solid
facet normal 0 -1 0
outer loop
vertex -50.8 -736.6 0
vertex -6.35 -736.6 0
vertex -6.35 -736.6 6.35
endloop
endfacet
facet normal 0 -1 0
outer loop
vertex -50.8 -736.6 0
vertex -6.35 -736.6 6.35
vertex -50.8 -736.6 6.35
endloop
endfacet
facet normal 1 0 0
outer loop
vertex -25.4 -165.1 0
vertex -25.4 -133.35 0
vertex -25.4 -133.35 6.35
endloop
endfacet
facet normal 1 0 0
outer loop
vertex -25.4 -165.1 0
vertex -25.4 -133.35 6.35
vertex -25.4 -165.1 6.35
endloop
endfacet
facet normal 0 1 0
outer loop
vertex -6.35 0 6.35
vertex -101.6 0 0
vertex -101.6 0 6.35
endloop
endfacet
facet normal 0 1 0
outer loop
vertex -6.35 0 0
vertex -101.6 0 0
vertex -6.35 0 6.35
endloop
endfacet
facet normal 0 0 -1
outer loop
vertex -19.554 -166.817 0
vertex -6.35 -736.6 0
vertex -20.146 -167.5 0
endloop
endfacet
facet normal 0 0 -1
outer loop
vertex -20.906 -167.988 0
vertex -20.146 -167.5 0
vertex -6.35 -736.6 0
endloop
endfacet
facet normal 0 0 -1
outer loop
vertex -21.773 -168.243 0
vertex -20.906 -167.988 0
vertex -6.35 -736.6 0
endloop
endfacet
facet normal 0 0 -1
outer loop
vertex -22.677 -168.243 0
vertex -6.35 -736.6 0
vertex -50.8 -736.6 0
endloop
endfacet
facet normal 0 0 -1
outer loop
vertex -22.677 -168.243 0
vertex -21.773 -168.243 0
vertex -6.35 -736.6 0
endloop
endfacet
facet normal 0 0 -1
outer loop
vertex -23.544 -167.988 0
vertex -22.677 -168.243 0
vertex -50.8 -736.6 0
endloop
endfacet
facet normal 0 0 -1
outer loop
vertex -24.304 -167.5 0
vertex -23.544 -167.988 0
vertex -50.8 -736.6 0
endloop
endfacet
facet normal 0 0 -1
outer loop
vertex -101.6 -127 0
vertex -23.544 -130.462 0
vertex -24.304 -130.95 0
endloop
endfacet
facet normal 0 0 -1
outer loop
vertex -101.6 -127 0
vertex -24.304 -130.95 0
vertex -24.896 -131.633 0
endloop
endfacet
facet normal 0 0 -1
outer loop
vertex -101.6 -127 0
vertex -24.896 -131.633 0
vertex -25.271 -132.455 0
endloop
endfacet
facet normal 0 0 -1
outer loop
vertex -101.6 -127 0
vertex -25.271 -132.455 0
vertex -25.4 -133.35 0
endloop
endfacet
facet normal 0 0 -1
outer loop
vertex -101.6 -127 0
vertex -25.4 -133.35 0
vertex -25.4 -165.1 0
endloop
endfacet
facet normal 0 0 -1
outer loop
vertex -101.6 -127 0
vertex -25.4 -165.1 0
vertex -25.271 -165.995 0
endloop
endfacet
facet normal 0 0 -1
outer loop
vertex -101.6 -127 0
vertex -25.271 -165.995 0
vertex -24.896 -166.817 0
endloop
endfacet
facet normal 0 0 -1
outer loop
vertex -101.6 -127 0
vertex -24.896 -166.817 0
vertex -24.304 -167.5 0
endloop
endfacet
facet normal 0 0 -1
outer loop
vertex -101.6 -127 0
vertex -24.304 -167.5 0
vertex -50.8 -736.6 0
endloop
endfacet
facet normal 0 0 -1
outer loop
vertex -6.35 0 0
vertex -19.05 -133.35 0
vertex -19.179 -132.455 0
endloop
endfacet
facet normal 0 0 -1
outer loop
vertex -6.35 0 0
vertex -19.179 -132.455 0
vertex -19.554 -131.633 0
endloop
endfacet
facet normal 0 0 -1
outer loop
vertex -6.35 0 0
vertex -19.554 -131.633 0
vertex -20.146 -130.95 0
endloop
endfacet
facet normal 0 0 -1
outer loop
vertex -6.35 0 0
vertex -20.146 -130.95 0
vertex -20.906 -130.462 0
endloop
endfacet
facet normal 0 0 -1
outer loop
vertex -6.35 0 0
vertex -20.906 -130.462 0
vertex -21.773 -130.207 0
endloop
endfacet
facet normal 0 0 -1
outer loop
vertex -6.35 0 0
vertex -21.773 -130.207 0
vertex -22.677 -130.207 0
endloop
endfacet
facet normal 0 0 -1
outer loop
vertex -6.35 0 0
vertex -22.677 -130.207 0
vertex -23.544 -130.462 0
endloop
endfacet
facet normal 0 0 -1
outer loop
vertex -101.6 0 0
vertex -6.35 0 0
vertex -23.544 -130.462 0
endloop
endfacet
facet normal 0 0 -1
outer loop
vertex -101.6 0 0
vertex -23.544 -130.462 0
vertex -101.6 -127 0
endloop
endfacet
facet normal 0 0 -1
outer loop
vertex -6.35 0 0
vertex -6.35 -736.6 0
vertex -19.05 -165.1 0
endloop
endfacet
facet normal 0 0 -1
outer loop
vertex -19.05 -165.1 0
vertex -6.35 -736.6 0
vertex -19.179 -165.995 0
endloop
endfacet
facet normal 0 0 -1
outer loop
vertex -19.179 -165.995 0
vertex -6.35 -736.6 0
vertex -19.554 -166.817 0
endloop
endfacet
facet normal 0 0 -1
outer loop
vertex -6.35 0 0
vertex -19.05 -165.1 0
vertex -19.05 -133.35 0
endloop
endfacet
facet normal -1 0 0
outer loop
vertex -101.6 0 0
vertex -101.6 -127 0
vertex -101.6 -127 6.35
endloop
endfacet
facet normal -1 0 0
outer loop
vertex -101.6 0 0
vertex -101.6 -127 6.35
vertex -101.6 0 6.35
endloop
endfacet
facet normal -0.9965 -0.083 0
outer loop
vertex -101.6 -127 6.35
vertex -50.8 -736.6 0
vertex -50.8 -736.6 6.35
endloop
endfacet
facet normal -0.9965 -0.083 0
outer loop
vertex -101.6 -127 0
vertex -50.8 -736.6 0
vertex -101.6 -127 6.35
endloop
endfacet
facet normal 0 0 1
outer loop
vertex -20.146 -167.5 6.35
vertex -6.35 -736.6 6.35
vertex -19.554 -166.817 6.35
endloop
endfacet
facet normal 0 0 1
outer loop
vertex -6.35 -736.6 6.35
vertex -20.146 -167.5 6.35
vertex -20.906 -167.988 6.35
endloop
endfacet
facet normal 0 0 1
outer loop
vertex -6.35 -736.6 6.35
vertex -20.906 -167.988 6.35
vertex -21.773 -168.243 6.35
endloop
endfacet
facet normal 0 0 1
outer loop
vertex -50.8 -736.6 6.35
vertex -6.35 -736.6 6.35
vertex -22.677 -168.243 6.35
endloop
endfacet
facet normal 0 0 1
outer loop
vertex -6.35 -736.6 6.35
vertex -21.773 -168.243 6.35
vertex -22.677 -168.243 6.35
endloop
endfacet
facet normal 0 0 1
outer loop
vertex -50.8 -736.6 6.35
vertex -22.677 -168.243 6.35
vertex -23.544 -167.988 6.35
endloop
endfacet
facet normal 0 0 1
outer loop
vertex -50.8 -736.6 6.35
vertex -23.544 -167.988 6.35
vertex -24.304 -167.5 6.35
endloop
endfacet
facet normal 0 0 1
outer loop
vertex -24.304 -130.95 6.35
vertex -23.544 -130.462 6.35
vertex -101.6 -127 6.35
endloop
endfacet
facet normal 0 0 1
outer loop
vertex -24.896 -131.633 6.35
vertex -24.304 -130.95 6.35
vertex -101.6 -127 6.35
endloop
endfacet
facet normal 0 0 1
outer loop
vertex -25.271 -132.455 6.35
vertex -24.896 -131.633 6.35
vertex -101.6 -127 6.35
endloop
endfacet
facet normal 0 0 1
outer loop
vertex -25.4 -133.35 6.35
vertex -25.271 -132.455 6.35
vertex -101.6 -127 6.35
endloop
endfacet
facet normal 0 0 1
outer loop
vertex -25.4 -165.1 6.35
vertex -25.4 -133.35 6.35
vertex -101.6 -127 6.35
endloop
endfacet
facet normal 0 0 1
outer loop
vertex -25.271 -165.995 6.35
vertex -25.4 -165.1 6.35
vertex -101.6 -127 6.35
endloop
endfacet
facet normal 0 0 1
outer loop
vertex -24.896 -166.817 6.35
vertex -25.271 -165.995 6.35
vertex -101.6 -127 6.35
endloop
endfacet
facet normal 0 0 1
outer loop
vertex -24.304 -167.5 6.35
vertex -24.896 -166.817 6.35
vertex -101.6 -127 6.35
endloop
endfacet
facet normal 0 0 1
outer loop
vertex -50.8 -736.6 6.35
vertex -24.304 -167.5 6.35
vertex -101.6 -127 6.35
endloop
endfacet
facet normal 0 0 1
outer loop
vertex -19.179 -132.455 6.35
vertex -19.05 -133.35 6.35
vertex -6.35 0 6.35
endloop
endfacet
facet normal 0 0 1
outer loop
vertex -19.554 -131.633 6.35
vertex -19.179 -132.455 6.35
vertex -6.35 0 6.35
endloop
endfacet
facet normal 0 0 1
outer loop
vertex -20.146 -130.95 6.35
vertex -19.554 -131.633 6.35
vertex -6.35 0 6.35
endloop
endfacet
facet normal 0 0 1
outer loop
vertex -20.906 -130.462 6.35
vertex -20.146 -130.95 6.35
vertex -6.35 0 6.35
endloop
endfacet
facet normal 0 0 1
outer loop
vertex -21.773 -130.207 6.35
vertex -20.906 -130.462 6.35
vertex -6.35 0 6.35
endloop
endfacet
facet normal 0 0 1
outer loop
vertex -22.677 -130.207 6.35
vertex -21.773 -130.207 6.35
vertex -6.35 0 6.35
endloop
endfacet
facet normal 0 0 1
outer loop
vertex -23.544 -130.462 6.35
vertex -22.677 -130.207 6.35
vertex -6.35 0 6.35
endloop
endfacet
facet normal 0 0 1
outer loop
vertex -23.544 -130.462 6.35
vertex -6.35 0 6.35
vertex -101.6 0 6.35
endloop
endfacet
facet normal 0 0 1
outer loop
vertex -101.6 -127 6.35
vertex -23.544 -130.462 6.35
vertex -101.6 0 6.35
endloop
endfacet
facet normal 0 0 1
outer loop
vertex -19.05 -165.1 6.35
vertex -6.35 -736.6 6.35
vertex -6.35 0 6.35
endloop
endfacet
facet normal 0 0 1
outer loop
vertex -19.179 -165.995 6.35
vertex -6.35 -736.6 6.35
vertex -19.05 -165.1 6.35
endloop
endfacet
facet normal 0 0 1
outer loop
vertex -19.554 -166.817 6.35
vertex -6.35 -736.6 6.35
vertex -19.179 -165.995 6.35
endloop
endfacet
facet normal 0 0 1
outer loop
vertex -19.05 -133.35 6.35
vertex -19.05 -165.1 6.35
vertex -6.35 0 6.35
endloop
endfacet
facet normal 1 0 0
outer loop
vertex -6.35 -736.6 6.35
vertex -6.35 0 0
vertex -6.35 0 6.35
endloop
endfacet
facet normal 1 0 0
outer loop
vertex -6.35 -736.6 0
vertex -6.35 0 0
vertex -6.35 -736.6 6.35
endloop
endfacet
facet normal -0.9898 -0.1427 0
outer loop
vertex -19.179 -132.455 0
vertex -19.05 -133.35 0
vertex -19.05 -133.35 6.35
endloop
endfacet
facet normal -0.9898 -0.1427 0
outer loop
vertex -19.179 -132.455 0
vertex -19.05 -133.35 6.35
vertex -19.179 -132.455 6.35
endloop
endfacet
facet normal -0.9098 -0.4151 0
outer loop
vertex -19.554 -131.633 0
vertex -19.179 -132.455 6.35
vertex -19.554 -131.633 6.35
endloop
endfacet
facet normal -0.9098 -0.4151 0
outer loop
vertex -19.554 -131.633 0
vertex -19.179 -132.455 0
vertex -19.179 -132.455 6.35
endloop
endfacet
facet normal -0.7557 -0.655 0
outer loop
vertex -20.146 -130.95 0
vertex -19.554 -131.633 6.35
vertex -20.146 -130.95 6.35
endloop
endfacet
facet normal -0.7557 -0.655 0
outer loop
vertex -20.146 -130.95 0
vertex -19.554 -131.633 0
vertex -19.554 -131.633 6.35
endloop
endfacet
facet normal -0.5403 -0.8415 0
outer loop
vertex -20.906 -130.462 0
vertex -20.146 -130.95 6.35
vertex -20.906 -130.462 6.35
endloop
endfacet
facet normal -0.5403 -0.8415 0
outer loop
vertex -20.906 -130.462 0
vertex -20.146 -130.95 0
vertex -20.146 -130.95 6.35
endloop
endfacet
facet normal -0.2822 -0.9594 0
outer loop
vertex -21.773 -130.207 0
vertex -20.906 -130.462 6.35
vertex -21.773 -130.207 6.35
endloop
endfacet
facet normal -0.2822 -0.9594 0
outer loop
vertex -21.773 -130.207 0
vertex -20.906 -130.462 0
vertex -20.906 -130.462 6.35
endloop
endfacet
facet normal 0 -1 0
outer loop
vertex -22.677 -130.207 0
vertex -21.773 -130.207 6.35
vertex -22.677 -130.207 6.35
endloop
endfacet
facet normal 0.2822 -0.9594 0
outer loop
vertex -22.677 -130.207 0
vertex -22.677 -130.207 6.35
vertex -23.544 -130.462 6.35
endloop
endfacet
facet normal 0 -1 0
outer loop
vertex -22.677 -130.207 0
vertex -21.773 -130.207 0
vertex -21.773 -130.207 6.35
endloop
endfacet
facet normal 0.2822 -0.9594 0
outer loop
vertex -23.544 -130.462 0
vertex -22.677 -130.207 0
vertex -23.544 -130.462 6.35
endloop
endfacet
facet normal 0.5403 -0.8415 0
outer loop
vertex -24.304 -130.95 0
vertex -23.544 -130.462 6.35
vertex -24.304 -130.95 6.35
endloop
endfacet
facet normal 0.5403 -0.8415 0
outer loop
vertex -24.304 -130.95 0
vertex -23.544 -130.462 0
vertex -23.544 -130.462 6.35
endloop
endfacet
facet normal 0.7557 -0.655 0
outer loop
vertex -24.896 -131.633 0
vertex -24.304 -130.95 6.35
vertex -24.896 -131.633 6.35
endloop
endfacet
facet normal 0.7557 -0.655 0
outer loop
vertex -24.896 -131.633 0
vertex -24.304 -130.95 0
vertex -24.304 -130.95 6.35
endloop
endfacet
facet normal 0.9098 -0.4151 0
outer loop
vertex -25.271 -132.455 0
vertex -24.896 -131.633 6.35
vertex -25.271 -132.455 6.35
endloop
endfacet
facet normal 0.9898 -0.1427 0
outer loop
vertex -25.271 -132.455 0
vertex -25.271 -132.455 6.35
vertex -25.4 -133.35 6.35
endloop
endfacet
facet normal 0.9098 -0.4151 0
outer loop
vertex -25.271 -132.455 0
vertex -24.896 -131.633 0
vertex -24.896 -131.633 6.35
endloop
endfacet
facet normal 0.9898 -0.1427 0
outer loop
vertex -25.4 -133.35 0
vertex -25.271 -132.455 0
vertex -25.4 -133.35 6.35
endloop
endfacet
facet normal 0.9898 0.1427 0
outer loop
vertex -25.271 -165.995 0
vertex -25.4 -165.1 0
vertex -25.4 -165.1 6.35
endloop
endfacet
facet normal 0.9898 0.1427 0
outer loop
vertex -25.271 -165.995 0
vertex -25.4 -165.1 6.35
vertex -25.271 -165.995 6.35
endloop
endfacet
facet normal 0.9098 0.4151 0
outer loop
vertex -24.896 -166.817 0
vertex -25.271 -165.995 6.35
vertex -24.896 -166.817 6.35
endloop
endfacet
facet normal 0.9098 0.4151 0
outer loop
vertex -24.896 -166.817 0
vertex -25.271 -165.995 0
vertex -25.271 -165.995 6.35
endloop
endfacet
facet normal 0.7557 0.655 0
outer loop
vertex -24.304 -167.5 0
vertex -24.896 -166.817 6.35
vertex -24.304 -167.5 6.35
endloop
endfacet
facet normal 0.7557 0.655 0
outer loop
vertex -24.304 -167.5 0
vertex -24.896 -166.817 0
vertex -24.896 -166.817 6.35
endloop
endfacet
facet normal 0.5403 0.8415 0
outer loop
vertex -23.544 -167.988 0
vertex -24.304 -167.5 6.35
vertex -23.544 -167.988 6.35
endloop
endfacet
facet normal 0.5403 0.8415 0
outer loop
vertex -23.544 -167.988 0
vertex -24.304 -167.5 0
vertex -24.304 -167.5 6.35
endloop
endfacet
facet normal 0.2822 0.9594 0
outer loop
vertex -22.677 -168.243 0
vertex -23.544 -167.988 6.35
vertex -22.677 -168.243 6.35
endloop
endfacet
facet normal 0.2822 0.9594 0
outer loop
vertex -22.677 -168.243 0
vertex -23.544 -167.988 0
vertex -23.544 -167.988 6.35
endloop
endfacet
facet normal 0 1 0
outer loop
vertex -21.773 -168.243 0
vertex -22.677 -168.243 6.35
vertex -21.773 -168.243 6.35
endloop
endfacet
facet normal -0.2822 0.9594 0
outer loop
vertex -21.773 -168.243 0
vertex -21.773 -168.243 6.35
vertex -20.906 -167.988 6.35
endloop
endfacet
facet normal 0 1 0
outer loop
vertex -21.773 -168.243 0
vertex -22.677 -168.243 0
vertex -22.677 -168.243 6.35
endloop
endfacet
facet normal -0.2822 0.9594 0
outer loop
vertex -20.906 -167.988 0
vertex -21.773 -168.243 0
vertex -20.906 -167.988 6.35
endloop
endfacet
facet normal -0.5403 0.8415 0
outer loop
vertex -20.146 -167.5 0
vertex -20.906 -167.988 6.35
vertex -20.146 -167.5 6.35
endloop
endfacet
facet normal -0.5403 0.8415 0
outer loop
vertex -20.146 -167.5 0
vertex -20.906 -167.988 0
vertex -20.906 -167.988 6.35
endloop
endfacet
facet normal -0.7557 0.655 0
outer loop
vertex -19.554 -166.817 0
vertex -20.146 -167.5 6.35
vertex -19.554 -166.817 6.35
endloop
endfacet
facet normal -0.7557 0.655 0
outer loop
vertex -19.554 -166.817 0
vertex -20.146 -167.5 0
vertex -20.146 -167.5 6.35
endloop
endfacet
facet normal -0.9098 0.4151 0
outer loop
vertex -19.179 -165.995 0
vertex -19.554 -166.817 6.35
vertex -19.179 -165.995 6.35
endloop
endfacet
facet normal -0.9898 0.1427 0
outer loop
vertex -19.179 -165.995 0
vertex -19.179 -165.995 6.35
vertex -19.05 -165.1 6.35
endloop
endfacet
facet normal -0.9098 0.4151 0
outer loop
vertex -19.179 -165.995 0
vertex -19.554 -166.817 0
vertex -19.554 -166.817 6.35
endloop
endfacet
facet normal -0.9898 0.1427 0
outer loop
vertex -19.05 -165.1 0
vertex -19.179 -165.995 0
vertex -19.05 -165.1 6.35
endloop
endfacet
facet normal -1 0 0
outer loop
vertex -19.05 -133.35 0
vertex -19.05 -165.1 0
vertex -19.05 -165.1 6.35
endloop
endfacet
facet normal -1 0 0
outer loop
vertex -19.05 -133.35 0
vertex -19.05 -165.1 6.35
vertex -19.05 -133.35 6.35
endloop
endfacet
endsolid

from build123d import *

# Parameters (mm, degrees)
F1_DEPTH = 6.35


with BuildPart() as f1:
    # F0 (on Top) → F1 (new body)
    with BuildSketch(Plane.XY):
        Polygon((101.6, 0), (6.35, 0), (6.35, -736.6), (50.8, -736.6), (101.6, -127), align=None)
        with BuildLine():
            ThreePointArc((19.05, -133.35), (22.225, -130.175), (25.4, -133.35))
            Line((25.4, -133.35), (25.4, -165.1))
            ThreePointArc((25.4, -165.1), (22.225, -168.275), (19.05, -165.1))
            Line((19.05, -165.1), (19.05, -133.35))
        make_face(mode=Mode.SUBTRACT)
    extrude(amount=F1_DEPTH)


with BuildPart() as f2_1:
    # F2: instance of F1
    add(f1.part.mirror(Plane.YZ))


solid = f2_1.part
